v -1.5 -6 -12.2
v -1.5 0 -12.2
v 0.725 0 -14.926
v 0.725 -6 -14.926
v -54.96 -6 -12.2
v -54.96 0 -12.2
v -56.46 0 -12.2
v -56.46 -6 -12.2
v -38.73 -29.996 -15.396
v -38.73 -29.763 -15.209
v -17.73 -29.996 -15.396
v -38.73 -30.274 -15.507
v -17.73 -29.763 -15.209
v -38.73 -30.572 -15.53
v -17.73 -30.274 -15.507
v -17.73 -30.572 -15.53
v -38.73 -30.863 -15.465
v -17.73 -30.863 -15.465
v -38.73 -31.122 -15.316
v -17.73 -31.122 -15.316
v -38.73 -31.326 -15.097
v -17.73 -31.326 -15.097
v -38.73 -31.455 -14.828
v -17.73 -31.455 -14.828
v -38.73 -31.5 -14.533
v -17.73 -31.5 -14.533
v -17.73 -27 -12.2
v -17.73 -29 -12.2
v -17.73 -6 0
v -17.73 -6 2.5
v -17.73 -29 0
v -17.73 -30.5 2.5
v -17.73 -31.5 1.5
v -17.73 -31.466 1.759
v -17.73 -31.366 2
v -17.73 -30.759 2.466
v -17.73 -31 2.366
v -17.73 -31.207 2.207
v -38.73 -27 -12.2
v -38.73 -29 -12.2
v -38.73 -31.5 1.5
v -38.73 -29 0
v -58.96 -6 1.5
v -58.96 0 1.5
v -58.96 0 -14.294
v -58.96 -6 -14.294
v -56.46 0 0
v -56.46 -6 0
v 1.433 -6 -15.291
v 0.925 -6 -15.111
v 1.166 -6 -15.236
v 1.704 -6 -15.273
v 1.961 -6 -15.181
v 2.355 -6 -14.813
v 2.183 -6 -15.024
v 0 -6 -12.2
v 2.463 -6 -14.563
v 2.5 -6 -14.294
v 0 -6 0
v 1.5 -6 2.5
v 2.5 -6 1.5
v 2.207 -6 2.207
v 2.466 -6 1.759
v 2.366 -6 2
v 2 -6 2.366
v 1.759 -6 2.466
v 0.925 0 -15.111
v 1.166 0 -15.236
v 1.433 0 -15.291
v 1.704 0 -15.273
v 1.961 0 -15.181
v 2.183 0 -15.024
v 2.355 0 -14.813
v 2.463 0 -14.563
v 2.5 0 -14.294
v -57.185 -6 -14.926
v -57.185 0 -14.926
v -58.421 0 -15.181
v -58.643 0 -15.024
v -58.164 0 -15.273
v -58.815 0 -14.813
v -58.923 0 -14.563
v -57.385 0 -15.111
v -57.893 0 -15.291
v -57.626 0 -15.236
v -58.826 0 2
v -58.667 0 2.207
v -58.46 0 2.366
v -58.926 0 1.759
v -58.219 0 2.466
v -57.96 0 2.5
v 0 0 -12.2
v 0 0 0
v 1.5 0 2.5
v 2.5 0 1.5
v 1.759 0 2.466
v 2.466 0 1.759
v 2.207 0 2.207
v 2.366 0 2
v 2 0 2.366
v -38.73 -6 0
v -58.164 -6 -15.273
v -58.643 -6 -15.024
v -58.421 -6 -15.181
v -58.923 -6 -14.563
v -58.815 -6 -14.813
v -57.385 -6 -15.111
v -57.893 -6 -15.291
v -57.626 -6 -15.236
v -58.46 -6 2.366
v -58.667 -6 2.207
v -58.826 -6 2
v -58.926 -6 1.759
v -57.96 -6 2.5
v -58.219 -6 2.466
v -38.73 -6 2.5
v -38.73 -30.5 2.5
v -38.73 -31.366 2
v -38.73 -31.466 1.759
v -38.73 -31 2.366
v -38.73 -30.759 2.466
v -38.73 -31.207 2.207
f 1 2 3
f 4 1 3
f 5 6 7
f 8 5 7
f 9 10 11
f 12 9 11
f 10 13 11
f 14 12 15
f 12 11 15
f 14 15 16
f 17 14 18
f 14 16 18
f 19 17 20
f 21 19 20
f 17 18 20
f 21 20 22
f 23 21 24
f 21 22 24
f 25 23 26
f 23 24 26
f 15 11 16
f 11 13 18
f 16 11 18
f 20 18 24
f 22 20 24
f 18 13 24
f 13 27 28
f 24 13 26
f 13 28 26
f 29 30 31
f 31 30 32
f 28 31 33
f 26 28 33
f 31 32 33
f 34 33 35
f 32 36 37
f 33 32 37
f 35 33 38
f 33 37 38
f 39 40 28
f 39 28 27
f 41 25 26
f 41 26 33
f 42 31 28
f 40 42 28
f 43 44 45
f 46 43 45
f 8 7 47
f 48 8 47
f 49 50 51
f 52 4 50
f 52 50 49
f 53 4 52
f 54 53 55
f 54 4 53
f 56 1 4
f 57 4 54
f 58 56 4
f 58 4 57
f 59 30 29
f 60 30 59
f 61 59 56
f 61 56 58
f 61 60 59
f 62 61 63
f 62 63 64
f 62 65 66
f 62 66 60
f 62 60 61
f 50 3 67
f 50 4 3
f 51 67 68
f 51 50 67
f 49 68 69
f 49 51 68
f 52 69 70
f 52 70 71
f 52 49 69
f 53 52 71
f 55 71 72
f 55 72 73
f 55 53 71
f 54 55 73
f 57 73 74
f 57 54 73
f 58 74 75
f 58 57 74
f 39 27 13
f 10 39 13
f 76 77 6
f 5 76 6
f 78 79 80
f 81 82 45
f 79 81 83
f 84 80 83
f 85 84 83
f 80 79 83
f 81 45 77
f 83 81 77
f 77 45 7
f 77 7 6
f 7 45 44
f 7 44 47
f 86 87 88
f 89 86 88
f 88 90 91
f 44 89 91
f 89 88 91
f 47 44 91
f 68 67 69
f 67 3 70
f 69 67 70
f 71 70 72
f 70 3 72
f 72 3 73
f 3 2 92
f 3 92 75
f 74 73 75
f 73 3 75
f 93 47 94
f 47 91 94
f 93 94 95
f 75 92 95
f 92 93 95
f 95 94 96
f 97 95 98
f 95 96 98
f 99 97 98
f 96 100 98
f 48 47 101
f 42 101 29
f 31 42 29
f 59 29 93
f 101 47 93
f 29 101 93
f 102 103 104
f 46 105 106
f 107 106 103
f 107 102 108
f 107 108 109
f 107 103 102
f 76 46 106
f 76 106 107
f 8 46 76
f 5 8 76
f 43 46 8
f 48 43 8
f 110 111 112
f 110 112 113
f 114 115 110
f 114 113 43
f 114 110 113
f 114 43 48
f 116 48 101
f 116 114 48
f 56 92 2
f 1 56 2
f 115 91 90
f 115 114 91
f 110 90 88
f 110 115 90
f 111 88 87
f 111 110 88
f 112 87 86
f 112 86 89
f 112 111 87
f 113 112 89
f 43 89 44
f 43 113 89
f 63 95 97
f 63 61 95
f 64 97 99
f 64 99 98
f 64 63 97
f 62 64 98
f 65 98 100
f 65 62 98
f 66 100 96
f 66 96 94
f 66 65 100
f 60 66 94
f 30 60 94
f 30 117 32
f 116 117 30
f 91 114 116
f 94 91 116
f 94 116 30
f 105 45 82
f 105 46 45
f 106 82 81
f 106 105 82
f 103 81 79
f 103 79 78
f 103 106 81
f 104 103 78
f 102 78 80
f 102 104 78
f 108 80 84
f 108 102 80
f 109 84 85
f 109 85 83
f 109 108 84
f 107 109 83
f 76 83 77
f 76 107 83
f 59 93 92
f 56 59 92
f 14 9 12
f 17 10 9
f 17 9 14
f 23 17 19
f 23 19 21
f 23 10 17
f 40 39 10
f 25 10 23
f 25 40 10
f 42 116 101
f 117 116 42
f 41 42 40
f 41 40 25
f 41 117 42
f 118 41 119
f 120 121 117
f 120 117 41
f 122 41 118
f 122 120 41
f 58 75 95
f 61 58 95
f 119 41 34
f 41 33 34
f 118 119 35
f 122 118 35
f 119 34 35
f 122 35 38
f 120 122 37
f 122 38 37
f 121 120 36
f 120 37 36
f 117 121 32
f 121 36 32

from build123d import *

# Parameters (mm, degrees)
F1_DEPTH = 6
F2_R     = 1
F4_DEPTH = 2.5
F6_DEPTH = 21
F7_R     = 1
F8_R     = 1


with BuildPart() as f1:
    # F0 (on Front) → F1 (new body)
    with BuildSketch(Plane.XZ):
        Polygon((0, 0), (0, -12.2), (-1.5, -12.2), (2.5, -17.1), (2.5, 0), (2.5, 2.5), (0, 2.5), (-16.5, 2.5), (-28.23, 2.5), (-39.96, 2.5), (-56.46, 2.5), (-58.96, 2.5), (-58.96, 0), (-58.96, -17.1), (-54.96, -12.2), (-56.46, -12.2), (-56.46, 0), (-46.36, 0), (-28.23, 0), (-10.1, 0), align=None)
    extrude(amount=F1_DEPTH)

    # F2
    f2_edges = [f1.edges().sort_by_distance(p)[0] for p in [
        (-58.96, -3, -17.1),
        (2.5, -3, -17.1),
        (-58.96, -3, 2.5),
        (2.5, -3, 2.5),
    ]]
    fillet(f2_edges, radius=F2_R)

    # F3 (on face) → F4 (join)
    with BuildSketch(Plane.XY.offset(2.5)):
        Polygon((-17.73, -6), (-38.73, -6), (-38.73, -29), (-28.23, -29), (-17.73, -29), align=None)
    extrude(amount=-F4_DEPTH)

    # F5 (on face) → F6 (join)
    with BuildSketch(Plane(origin=(-38.73, 0, 0), x_dir=(0, -1, 0), z_dir=(-1, 0, 0))):
        Polygon((31.5, 2.5), (29, 2.5), (29, -12.2), (27, -12.2), (31.5, -17.1), align=None)
    extrude(amount=-F6_DEPTH)

    # F7
    f7_edges = [f1.edges().sort_by_distance(p)[0] for p in [
        (-28.23, -31.5, -17.1),
    ]]
    fillet(f7_edges, radius=F7_R)

    # F8
    f8_edges = [f1.edges().sort_by_distance(p)[0] for p in [
        (-28.23, -31.5, 2.5),
    ]]
    fillet(f8_edges, radius=F8_R)


solid = f1.part
